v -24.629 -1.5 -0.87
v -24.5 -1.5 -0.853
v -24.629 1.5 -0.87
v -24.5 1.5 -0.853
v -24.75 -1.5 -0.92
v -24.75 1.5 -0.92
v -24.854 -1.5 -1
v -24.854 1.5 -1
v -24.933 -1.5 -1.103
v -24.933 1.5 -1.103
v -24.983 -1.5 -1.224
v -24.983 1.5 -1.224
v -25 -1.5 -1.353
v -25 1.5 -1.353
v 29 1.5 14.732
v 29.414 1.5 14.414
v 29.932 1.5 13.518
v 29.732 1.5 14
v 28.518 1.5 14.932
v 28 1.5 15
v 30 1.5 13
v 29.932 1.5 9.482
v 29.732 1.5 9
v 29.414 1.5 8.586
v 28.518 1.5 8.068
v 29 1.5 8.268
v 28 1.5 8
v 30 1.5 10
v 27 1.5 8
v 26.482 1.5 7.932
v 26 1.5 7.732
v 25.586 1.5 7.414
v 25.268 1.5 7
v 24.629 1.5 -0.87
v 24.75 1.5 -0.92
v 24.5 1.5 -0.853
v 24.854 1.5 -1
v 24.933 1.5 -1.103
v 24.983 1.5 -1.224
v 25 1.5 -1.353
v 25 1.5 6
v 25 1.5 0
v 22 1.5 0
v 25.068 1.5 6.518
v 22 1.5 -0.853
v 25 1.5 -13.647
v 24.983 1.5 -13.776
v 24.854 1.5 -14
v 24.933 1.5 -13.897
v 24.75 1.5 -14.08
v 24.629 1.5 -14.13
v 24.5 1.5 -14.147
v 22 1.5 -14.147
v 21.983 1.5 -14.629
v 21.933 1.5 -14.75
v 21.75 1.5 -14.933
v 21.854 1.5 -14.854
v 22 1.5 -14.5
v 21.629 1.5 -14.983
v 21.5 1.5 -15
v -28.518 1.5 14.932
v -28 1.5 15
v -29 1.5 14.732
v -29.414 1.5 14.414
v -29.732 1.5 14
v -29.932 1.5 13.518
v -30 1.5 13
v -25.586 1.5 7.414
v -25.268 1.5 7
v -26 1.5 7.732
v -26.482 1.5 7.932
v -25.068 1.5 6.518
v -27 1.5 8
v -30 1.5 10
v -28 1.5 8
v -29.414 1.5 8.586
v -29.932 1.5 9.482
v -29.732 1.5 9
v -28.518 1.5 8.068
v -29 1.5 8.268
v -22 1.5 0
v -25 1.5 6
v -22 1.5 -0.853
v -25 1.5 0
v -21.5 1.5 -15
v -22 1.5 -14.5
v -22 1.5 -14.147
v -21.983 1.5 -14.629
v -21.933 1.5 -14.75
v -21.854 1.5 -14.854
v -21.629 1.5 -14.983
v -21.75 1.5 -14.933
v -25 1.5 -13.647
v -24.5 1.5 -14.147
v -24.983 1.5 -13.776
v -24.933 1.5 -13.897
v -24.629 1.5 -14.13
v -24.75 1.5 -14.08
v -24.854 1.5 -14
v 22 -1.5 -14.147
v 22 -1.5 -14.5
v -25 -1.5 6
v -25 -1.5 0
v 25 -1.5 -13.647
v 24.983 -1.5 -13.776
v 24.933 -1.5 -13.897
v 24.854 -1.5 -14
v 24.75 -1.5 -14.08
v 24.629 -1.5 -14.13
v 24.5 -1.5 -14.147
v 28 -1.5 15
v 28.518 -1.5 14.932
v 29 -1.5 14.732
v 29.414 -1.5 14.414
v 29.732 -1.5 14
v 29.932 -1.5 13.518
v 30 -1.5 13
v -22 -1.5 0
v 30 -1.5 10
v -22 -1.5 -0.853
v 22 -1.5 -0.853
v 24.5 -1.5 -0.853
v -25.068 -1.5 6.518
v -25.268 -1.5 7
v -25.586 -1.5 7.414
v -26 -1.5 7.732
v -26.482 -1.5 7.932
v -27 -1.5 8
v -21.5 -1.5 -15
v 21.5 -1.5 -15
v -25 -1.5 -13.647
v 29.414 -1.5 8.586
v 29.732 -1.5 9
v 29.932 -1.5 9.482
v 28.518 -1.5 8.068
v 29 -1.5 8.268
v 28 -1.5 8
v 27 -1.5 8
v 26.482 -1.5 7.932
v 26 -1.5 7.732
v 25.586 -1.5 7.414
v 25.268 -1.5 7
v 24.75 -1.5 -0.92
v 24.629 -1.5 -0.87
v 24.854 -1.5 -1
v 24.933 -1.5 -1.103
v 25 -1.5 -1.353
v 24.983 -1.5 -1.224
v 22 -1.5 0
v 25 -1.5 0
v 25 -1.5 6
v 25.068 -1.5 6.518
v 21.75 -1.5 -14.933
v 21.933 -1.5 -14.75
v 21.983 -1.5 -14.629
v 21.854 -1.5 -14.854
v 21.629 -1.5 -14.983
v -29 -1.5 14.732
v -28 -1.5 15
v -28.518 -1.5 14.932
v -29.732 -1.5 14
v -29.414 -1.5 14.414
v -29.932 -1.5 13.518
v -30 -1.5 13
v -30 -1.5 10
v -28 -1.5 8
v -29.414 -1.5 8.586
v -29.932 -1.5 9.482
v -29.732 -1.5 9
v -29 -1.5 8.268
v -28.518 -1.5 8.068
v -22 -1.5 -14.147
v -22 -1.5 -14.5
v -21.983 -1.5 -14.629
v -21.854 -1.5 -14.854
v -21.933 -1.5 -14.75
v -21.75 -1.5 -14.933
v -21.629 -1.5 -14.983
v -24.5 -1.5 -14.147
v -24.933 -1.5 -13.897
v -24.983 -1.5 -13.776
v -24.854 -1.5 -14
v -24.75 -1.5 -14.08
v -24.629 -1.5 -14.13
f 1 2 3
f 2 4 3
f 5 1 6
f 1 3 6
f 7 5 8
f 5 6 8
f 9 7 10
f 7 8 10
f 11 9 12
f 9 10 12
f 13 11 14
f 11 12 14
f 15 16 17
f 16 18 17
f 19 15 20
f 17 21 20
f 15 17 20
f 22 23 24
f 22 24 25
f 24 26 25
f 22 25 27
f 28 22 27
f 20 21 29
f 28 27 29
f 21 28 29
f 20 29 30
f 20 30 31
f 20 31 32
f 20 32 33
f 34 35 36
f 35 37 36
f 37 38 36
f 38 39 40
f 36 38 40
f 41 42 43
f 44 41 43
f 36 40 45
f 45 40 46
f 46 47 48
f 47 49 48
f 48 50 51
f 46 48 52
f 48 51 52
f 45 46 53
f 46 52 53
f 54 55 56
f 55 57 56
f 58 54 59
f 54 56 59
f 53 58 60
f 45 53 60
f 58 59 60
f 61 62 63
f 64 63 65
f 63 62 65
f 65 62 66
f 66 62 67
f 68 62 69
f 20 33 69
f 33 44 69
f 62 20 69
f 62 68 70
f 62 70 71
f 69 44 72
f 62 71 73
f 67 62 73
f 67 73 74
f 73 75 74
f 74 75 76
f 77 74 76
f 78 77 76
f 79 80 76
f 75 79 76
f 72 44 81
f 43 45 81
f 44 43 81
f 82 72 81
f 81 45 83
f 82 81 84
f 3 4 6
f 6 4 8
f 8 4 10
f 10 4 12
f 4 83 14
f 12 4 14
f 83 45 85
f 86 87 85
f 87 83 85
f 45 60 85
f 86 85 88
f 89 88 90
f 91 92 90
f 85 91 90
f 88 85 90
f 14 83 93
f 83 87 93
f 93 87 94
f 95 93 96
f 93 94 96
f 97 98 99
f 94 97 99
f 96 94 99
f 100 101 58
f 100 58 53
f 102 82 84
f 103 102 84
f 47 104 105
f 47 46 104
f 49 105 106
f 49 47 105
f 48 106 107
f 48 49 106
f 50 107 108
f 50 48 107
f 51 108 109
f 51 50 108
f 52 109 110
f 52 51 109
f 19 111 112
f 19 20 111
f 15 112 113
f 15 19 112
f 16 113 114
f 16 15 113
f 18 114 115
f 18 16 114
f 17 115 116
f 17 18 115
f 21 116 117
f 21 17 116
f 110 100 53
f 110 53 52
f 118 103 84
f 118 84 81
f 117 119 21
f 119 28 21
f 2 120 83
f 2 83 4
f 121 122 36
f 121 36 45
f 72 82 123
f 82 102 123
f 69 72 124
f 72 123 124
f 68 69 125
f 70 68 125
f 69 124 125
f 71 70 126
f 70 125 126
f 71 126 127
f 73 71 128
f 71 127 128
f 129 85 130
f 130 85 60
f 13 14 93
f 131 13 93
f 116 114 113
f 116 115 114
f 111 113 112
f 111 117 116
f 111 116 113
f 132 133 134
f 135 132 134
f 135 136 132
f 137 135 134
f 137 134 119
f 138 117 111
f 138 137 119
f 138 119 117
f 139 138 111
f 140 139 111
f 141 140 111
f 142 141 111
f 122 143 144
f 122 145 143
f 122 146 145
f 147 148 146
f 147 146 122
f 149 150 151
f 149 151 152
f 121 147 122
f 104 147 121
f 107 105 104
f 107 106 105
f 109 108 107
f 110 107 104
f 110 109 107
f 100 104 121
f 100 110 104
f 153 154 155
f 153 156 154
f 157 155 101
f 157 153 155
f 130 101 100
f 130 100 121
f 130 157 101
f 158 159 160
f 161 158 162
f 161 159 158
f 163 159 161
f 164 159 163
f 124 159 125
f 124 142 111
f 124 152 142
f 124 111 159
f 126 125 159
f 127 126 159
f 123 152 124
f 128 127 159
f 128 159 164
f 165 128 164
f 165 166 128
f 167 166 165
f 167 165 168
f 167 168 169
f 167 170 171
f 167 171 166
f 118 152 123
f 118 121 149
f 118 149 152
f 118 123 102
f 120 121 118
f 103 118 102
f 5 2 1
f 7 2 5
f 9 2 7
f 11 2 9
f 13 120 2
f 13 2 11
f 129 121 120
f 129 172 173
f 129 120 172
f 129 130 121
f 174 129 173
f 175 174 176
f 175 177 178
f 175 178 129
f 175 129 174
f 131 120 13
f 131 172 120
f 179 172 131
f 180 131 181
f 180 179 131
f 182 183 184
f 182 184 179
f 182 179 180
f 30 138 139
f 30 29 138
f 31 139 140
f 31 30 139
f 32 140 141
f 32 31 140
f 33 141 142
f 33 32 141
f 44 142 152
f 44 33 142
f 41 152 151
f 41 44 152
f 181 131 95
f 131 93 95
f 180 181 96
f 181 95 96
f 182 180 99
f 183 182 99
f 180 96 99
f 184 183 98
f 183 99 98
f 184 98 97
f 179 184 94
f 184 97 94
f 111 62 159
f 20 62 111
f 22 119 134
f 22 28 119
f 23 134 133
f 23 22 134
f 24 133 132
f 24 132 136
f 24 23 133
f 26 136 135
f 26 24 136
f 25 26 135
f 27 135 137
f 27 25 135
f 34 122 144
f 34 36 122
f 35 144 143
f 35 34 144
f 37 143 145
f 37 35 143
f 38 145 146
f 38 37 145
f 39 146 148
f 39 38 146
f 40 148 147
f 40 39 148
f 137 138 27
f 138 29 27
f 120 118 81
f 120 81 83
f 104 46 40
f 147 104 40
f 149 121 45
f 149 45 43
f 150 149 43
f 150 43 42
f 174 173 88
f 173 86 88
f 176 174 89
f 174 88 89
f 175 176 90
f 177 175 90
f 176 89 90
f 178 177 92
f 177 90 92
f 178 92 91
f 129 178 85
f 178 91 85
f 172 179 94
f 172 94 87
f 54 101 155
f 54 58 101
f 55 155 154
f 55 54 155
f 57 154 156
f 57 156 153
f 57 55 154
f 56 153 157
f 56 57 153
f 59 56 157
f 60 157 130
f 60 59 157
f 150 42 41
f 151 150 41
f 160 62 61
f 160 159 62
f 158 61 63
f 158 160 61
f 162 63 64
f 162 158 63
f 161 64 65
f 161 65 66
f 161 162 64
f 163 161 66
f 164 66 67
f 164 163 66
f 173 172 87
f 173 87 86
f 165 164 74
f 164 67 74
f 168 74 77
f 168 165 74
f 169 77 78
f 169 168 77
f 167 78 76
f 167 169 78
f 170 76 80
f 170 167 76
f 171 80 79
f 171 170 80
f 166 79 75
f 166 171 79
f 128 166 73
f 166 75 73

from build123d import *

# Parameters (mm, degrees)
BOSS_EXTRUDE1_DEPTH     = 1.5
CUT_EXTRUDE1_DEPTH      = 34.674916481
CUT_EXTRUDE1_DEPTH_BACK = 34.674916481
FILLET1_R               = 2
FILLET2_R               = 0.5


with BuildPart() as part:
    # Sketch1 → Boss-Extrude1 (new, symmetric)
    with BuildSketch(Plane(origin=(0, 0, 0), x_dir=(1, 0, 0), z_dir=(0, 1, 0))):
        Polygon((-25, -15), (-30, -15), (-30, -8), (-25, -8), (-25, 15), (25, 15), (25, -8), (30, -8), (30, -15), (25, -15), align=None)
    extrude(amount=BOSS_EXTRUDE1_DEPTH, both=True)

    # Sketch2 → Cut-Extrude1 (cut, two sides: drawn at the far end of the back side and taken through both)
    with BuildSketch(Plane(origin=(0, 1.5, 0), x_dir=(1, 0, 0), z_dir=(0, 1, 0)).offset(-CUT_EXTRUDE1_DEPTH_BACK)):
        with BuildLine():
            Line((-25, 14.146806682), (-22, 14.146806682))
            Line((-22, 14.146806682), (-22, 15))
            Line((-22, 15), (-25, 15))
            ThreePointArc((-25, 15), (-30.216117819, 7.5), (-25, 0))
            Line((-25, 0), (-22, 0))
            Line((-22, 0), (-22, 0.853193318))
            Line((-22, 0.853193318), (-25, 0.853193318))
            ThreePointArc((-25, 0.853193318), (-29.422367819, 7.5), (-25, 14.146806682))
        make_face()
        with BuildLine():
            Line((22, 0.853193318), (22, 0))
            Line((22, 0), (25, 0))
            ThreePointArc((25, 0), (30.216117819, 7.5), (25, 15))
            Line((25, 15), (22, 15))
            Line((22, 15), (22, 14.146806682))
            Line((22, 14.146806682), (25, 14.146806682))
            ThreePointArc((25, 14.146806682), (29.422367819, 7.5), (25, 0.853193318))
            Line((25, 0.853193318), (22, 0.853193318))
        make_face()
    extrude(amount=CUT_EXTRUDE1_DEPTH + CUT_EXTRUDE1_DEPTH_BACK, mode=Mode.SUBTRACT)

    # Fillet1
    fillet1_edges = [part.edges().sort_by_distance(p)[0] for p in [
        (25, 0, 8),
        (30, 0, 8),
        (30, 0, 15),
        (-30, 0, 15),
        (-30, 0, 8),
        (-25, 0, 8),
    ]]
    fillet(fillet1_edges, radius=FILLET1_R)

    # Fillet2
    fillet2_edges = [part.edges().sort_by_distance(p)[0] for p in [
        (-25, 0, -14.146806682),
        (-25, 0, -0.853193318),
        (25, 0, -14.146806682),
        (25, 0, -0.853193318),
        (-22, 0, -15),
        (22, 0, -15),
    ]]
    fillet(fillet2_edges, radius=FILLET2_R)


solid = part.part
